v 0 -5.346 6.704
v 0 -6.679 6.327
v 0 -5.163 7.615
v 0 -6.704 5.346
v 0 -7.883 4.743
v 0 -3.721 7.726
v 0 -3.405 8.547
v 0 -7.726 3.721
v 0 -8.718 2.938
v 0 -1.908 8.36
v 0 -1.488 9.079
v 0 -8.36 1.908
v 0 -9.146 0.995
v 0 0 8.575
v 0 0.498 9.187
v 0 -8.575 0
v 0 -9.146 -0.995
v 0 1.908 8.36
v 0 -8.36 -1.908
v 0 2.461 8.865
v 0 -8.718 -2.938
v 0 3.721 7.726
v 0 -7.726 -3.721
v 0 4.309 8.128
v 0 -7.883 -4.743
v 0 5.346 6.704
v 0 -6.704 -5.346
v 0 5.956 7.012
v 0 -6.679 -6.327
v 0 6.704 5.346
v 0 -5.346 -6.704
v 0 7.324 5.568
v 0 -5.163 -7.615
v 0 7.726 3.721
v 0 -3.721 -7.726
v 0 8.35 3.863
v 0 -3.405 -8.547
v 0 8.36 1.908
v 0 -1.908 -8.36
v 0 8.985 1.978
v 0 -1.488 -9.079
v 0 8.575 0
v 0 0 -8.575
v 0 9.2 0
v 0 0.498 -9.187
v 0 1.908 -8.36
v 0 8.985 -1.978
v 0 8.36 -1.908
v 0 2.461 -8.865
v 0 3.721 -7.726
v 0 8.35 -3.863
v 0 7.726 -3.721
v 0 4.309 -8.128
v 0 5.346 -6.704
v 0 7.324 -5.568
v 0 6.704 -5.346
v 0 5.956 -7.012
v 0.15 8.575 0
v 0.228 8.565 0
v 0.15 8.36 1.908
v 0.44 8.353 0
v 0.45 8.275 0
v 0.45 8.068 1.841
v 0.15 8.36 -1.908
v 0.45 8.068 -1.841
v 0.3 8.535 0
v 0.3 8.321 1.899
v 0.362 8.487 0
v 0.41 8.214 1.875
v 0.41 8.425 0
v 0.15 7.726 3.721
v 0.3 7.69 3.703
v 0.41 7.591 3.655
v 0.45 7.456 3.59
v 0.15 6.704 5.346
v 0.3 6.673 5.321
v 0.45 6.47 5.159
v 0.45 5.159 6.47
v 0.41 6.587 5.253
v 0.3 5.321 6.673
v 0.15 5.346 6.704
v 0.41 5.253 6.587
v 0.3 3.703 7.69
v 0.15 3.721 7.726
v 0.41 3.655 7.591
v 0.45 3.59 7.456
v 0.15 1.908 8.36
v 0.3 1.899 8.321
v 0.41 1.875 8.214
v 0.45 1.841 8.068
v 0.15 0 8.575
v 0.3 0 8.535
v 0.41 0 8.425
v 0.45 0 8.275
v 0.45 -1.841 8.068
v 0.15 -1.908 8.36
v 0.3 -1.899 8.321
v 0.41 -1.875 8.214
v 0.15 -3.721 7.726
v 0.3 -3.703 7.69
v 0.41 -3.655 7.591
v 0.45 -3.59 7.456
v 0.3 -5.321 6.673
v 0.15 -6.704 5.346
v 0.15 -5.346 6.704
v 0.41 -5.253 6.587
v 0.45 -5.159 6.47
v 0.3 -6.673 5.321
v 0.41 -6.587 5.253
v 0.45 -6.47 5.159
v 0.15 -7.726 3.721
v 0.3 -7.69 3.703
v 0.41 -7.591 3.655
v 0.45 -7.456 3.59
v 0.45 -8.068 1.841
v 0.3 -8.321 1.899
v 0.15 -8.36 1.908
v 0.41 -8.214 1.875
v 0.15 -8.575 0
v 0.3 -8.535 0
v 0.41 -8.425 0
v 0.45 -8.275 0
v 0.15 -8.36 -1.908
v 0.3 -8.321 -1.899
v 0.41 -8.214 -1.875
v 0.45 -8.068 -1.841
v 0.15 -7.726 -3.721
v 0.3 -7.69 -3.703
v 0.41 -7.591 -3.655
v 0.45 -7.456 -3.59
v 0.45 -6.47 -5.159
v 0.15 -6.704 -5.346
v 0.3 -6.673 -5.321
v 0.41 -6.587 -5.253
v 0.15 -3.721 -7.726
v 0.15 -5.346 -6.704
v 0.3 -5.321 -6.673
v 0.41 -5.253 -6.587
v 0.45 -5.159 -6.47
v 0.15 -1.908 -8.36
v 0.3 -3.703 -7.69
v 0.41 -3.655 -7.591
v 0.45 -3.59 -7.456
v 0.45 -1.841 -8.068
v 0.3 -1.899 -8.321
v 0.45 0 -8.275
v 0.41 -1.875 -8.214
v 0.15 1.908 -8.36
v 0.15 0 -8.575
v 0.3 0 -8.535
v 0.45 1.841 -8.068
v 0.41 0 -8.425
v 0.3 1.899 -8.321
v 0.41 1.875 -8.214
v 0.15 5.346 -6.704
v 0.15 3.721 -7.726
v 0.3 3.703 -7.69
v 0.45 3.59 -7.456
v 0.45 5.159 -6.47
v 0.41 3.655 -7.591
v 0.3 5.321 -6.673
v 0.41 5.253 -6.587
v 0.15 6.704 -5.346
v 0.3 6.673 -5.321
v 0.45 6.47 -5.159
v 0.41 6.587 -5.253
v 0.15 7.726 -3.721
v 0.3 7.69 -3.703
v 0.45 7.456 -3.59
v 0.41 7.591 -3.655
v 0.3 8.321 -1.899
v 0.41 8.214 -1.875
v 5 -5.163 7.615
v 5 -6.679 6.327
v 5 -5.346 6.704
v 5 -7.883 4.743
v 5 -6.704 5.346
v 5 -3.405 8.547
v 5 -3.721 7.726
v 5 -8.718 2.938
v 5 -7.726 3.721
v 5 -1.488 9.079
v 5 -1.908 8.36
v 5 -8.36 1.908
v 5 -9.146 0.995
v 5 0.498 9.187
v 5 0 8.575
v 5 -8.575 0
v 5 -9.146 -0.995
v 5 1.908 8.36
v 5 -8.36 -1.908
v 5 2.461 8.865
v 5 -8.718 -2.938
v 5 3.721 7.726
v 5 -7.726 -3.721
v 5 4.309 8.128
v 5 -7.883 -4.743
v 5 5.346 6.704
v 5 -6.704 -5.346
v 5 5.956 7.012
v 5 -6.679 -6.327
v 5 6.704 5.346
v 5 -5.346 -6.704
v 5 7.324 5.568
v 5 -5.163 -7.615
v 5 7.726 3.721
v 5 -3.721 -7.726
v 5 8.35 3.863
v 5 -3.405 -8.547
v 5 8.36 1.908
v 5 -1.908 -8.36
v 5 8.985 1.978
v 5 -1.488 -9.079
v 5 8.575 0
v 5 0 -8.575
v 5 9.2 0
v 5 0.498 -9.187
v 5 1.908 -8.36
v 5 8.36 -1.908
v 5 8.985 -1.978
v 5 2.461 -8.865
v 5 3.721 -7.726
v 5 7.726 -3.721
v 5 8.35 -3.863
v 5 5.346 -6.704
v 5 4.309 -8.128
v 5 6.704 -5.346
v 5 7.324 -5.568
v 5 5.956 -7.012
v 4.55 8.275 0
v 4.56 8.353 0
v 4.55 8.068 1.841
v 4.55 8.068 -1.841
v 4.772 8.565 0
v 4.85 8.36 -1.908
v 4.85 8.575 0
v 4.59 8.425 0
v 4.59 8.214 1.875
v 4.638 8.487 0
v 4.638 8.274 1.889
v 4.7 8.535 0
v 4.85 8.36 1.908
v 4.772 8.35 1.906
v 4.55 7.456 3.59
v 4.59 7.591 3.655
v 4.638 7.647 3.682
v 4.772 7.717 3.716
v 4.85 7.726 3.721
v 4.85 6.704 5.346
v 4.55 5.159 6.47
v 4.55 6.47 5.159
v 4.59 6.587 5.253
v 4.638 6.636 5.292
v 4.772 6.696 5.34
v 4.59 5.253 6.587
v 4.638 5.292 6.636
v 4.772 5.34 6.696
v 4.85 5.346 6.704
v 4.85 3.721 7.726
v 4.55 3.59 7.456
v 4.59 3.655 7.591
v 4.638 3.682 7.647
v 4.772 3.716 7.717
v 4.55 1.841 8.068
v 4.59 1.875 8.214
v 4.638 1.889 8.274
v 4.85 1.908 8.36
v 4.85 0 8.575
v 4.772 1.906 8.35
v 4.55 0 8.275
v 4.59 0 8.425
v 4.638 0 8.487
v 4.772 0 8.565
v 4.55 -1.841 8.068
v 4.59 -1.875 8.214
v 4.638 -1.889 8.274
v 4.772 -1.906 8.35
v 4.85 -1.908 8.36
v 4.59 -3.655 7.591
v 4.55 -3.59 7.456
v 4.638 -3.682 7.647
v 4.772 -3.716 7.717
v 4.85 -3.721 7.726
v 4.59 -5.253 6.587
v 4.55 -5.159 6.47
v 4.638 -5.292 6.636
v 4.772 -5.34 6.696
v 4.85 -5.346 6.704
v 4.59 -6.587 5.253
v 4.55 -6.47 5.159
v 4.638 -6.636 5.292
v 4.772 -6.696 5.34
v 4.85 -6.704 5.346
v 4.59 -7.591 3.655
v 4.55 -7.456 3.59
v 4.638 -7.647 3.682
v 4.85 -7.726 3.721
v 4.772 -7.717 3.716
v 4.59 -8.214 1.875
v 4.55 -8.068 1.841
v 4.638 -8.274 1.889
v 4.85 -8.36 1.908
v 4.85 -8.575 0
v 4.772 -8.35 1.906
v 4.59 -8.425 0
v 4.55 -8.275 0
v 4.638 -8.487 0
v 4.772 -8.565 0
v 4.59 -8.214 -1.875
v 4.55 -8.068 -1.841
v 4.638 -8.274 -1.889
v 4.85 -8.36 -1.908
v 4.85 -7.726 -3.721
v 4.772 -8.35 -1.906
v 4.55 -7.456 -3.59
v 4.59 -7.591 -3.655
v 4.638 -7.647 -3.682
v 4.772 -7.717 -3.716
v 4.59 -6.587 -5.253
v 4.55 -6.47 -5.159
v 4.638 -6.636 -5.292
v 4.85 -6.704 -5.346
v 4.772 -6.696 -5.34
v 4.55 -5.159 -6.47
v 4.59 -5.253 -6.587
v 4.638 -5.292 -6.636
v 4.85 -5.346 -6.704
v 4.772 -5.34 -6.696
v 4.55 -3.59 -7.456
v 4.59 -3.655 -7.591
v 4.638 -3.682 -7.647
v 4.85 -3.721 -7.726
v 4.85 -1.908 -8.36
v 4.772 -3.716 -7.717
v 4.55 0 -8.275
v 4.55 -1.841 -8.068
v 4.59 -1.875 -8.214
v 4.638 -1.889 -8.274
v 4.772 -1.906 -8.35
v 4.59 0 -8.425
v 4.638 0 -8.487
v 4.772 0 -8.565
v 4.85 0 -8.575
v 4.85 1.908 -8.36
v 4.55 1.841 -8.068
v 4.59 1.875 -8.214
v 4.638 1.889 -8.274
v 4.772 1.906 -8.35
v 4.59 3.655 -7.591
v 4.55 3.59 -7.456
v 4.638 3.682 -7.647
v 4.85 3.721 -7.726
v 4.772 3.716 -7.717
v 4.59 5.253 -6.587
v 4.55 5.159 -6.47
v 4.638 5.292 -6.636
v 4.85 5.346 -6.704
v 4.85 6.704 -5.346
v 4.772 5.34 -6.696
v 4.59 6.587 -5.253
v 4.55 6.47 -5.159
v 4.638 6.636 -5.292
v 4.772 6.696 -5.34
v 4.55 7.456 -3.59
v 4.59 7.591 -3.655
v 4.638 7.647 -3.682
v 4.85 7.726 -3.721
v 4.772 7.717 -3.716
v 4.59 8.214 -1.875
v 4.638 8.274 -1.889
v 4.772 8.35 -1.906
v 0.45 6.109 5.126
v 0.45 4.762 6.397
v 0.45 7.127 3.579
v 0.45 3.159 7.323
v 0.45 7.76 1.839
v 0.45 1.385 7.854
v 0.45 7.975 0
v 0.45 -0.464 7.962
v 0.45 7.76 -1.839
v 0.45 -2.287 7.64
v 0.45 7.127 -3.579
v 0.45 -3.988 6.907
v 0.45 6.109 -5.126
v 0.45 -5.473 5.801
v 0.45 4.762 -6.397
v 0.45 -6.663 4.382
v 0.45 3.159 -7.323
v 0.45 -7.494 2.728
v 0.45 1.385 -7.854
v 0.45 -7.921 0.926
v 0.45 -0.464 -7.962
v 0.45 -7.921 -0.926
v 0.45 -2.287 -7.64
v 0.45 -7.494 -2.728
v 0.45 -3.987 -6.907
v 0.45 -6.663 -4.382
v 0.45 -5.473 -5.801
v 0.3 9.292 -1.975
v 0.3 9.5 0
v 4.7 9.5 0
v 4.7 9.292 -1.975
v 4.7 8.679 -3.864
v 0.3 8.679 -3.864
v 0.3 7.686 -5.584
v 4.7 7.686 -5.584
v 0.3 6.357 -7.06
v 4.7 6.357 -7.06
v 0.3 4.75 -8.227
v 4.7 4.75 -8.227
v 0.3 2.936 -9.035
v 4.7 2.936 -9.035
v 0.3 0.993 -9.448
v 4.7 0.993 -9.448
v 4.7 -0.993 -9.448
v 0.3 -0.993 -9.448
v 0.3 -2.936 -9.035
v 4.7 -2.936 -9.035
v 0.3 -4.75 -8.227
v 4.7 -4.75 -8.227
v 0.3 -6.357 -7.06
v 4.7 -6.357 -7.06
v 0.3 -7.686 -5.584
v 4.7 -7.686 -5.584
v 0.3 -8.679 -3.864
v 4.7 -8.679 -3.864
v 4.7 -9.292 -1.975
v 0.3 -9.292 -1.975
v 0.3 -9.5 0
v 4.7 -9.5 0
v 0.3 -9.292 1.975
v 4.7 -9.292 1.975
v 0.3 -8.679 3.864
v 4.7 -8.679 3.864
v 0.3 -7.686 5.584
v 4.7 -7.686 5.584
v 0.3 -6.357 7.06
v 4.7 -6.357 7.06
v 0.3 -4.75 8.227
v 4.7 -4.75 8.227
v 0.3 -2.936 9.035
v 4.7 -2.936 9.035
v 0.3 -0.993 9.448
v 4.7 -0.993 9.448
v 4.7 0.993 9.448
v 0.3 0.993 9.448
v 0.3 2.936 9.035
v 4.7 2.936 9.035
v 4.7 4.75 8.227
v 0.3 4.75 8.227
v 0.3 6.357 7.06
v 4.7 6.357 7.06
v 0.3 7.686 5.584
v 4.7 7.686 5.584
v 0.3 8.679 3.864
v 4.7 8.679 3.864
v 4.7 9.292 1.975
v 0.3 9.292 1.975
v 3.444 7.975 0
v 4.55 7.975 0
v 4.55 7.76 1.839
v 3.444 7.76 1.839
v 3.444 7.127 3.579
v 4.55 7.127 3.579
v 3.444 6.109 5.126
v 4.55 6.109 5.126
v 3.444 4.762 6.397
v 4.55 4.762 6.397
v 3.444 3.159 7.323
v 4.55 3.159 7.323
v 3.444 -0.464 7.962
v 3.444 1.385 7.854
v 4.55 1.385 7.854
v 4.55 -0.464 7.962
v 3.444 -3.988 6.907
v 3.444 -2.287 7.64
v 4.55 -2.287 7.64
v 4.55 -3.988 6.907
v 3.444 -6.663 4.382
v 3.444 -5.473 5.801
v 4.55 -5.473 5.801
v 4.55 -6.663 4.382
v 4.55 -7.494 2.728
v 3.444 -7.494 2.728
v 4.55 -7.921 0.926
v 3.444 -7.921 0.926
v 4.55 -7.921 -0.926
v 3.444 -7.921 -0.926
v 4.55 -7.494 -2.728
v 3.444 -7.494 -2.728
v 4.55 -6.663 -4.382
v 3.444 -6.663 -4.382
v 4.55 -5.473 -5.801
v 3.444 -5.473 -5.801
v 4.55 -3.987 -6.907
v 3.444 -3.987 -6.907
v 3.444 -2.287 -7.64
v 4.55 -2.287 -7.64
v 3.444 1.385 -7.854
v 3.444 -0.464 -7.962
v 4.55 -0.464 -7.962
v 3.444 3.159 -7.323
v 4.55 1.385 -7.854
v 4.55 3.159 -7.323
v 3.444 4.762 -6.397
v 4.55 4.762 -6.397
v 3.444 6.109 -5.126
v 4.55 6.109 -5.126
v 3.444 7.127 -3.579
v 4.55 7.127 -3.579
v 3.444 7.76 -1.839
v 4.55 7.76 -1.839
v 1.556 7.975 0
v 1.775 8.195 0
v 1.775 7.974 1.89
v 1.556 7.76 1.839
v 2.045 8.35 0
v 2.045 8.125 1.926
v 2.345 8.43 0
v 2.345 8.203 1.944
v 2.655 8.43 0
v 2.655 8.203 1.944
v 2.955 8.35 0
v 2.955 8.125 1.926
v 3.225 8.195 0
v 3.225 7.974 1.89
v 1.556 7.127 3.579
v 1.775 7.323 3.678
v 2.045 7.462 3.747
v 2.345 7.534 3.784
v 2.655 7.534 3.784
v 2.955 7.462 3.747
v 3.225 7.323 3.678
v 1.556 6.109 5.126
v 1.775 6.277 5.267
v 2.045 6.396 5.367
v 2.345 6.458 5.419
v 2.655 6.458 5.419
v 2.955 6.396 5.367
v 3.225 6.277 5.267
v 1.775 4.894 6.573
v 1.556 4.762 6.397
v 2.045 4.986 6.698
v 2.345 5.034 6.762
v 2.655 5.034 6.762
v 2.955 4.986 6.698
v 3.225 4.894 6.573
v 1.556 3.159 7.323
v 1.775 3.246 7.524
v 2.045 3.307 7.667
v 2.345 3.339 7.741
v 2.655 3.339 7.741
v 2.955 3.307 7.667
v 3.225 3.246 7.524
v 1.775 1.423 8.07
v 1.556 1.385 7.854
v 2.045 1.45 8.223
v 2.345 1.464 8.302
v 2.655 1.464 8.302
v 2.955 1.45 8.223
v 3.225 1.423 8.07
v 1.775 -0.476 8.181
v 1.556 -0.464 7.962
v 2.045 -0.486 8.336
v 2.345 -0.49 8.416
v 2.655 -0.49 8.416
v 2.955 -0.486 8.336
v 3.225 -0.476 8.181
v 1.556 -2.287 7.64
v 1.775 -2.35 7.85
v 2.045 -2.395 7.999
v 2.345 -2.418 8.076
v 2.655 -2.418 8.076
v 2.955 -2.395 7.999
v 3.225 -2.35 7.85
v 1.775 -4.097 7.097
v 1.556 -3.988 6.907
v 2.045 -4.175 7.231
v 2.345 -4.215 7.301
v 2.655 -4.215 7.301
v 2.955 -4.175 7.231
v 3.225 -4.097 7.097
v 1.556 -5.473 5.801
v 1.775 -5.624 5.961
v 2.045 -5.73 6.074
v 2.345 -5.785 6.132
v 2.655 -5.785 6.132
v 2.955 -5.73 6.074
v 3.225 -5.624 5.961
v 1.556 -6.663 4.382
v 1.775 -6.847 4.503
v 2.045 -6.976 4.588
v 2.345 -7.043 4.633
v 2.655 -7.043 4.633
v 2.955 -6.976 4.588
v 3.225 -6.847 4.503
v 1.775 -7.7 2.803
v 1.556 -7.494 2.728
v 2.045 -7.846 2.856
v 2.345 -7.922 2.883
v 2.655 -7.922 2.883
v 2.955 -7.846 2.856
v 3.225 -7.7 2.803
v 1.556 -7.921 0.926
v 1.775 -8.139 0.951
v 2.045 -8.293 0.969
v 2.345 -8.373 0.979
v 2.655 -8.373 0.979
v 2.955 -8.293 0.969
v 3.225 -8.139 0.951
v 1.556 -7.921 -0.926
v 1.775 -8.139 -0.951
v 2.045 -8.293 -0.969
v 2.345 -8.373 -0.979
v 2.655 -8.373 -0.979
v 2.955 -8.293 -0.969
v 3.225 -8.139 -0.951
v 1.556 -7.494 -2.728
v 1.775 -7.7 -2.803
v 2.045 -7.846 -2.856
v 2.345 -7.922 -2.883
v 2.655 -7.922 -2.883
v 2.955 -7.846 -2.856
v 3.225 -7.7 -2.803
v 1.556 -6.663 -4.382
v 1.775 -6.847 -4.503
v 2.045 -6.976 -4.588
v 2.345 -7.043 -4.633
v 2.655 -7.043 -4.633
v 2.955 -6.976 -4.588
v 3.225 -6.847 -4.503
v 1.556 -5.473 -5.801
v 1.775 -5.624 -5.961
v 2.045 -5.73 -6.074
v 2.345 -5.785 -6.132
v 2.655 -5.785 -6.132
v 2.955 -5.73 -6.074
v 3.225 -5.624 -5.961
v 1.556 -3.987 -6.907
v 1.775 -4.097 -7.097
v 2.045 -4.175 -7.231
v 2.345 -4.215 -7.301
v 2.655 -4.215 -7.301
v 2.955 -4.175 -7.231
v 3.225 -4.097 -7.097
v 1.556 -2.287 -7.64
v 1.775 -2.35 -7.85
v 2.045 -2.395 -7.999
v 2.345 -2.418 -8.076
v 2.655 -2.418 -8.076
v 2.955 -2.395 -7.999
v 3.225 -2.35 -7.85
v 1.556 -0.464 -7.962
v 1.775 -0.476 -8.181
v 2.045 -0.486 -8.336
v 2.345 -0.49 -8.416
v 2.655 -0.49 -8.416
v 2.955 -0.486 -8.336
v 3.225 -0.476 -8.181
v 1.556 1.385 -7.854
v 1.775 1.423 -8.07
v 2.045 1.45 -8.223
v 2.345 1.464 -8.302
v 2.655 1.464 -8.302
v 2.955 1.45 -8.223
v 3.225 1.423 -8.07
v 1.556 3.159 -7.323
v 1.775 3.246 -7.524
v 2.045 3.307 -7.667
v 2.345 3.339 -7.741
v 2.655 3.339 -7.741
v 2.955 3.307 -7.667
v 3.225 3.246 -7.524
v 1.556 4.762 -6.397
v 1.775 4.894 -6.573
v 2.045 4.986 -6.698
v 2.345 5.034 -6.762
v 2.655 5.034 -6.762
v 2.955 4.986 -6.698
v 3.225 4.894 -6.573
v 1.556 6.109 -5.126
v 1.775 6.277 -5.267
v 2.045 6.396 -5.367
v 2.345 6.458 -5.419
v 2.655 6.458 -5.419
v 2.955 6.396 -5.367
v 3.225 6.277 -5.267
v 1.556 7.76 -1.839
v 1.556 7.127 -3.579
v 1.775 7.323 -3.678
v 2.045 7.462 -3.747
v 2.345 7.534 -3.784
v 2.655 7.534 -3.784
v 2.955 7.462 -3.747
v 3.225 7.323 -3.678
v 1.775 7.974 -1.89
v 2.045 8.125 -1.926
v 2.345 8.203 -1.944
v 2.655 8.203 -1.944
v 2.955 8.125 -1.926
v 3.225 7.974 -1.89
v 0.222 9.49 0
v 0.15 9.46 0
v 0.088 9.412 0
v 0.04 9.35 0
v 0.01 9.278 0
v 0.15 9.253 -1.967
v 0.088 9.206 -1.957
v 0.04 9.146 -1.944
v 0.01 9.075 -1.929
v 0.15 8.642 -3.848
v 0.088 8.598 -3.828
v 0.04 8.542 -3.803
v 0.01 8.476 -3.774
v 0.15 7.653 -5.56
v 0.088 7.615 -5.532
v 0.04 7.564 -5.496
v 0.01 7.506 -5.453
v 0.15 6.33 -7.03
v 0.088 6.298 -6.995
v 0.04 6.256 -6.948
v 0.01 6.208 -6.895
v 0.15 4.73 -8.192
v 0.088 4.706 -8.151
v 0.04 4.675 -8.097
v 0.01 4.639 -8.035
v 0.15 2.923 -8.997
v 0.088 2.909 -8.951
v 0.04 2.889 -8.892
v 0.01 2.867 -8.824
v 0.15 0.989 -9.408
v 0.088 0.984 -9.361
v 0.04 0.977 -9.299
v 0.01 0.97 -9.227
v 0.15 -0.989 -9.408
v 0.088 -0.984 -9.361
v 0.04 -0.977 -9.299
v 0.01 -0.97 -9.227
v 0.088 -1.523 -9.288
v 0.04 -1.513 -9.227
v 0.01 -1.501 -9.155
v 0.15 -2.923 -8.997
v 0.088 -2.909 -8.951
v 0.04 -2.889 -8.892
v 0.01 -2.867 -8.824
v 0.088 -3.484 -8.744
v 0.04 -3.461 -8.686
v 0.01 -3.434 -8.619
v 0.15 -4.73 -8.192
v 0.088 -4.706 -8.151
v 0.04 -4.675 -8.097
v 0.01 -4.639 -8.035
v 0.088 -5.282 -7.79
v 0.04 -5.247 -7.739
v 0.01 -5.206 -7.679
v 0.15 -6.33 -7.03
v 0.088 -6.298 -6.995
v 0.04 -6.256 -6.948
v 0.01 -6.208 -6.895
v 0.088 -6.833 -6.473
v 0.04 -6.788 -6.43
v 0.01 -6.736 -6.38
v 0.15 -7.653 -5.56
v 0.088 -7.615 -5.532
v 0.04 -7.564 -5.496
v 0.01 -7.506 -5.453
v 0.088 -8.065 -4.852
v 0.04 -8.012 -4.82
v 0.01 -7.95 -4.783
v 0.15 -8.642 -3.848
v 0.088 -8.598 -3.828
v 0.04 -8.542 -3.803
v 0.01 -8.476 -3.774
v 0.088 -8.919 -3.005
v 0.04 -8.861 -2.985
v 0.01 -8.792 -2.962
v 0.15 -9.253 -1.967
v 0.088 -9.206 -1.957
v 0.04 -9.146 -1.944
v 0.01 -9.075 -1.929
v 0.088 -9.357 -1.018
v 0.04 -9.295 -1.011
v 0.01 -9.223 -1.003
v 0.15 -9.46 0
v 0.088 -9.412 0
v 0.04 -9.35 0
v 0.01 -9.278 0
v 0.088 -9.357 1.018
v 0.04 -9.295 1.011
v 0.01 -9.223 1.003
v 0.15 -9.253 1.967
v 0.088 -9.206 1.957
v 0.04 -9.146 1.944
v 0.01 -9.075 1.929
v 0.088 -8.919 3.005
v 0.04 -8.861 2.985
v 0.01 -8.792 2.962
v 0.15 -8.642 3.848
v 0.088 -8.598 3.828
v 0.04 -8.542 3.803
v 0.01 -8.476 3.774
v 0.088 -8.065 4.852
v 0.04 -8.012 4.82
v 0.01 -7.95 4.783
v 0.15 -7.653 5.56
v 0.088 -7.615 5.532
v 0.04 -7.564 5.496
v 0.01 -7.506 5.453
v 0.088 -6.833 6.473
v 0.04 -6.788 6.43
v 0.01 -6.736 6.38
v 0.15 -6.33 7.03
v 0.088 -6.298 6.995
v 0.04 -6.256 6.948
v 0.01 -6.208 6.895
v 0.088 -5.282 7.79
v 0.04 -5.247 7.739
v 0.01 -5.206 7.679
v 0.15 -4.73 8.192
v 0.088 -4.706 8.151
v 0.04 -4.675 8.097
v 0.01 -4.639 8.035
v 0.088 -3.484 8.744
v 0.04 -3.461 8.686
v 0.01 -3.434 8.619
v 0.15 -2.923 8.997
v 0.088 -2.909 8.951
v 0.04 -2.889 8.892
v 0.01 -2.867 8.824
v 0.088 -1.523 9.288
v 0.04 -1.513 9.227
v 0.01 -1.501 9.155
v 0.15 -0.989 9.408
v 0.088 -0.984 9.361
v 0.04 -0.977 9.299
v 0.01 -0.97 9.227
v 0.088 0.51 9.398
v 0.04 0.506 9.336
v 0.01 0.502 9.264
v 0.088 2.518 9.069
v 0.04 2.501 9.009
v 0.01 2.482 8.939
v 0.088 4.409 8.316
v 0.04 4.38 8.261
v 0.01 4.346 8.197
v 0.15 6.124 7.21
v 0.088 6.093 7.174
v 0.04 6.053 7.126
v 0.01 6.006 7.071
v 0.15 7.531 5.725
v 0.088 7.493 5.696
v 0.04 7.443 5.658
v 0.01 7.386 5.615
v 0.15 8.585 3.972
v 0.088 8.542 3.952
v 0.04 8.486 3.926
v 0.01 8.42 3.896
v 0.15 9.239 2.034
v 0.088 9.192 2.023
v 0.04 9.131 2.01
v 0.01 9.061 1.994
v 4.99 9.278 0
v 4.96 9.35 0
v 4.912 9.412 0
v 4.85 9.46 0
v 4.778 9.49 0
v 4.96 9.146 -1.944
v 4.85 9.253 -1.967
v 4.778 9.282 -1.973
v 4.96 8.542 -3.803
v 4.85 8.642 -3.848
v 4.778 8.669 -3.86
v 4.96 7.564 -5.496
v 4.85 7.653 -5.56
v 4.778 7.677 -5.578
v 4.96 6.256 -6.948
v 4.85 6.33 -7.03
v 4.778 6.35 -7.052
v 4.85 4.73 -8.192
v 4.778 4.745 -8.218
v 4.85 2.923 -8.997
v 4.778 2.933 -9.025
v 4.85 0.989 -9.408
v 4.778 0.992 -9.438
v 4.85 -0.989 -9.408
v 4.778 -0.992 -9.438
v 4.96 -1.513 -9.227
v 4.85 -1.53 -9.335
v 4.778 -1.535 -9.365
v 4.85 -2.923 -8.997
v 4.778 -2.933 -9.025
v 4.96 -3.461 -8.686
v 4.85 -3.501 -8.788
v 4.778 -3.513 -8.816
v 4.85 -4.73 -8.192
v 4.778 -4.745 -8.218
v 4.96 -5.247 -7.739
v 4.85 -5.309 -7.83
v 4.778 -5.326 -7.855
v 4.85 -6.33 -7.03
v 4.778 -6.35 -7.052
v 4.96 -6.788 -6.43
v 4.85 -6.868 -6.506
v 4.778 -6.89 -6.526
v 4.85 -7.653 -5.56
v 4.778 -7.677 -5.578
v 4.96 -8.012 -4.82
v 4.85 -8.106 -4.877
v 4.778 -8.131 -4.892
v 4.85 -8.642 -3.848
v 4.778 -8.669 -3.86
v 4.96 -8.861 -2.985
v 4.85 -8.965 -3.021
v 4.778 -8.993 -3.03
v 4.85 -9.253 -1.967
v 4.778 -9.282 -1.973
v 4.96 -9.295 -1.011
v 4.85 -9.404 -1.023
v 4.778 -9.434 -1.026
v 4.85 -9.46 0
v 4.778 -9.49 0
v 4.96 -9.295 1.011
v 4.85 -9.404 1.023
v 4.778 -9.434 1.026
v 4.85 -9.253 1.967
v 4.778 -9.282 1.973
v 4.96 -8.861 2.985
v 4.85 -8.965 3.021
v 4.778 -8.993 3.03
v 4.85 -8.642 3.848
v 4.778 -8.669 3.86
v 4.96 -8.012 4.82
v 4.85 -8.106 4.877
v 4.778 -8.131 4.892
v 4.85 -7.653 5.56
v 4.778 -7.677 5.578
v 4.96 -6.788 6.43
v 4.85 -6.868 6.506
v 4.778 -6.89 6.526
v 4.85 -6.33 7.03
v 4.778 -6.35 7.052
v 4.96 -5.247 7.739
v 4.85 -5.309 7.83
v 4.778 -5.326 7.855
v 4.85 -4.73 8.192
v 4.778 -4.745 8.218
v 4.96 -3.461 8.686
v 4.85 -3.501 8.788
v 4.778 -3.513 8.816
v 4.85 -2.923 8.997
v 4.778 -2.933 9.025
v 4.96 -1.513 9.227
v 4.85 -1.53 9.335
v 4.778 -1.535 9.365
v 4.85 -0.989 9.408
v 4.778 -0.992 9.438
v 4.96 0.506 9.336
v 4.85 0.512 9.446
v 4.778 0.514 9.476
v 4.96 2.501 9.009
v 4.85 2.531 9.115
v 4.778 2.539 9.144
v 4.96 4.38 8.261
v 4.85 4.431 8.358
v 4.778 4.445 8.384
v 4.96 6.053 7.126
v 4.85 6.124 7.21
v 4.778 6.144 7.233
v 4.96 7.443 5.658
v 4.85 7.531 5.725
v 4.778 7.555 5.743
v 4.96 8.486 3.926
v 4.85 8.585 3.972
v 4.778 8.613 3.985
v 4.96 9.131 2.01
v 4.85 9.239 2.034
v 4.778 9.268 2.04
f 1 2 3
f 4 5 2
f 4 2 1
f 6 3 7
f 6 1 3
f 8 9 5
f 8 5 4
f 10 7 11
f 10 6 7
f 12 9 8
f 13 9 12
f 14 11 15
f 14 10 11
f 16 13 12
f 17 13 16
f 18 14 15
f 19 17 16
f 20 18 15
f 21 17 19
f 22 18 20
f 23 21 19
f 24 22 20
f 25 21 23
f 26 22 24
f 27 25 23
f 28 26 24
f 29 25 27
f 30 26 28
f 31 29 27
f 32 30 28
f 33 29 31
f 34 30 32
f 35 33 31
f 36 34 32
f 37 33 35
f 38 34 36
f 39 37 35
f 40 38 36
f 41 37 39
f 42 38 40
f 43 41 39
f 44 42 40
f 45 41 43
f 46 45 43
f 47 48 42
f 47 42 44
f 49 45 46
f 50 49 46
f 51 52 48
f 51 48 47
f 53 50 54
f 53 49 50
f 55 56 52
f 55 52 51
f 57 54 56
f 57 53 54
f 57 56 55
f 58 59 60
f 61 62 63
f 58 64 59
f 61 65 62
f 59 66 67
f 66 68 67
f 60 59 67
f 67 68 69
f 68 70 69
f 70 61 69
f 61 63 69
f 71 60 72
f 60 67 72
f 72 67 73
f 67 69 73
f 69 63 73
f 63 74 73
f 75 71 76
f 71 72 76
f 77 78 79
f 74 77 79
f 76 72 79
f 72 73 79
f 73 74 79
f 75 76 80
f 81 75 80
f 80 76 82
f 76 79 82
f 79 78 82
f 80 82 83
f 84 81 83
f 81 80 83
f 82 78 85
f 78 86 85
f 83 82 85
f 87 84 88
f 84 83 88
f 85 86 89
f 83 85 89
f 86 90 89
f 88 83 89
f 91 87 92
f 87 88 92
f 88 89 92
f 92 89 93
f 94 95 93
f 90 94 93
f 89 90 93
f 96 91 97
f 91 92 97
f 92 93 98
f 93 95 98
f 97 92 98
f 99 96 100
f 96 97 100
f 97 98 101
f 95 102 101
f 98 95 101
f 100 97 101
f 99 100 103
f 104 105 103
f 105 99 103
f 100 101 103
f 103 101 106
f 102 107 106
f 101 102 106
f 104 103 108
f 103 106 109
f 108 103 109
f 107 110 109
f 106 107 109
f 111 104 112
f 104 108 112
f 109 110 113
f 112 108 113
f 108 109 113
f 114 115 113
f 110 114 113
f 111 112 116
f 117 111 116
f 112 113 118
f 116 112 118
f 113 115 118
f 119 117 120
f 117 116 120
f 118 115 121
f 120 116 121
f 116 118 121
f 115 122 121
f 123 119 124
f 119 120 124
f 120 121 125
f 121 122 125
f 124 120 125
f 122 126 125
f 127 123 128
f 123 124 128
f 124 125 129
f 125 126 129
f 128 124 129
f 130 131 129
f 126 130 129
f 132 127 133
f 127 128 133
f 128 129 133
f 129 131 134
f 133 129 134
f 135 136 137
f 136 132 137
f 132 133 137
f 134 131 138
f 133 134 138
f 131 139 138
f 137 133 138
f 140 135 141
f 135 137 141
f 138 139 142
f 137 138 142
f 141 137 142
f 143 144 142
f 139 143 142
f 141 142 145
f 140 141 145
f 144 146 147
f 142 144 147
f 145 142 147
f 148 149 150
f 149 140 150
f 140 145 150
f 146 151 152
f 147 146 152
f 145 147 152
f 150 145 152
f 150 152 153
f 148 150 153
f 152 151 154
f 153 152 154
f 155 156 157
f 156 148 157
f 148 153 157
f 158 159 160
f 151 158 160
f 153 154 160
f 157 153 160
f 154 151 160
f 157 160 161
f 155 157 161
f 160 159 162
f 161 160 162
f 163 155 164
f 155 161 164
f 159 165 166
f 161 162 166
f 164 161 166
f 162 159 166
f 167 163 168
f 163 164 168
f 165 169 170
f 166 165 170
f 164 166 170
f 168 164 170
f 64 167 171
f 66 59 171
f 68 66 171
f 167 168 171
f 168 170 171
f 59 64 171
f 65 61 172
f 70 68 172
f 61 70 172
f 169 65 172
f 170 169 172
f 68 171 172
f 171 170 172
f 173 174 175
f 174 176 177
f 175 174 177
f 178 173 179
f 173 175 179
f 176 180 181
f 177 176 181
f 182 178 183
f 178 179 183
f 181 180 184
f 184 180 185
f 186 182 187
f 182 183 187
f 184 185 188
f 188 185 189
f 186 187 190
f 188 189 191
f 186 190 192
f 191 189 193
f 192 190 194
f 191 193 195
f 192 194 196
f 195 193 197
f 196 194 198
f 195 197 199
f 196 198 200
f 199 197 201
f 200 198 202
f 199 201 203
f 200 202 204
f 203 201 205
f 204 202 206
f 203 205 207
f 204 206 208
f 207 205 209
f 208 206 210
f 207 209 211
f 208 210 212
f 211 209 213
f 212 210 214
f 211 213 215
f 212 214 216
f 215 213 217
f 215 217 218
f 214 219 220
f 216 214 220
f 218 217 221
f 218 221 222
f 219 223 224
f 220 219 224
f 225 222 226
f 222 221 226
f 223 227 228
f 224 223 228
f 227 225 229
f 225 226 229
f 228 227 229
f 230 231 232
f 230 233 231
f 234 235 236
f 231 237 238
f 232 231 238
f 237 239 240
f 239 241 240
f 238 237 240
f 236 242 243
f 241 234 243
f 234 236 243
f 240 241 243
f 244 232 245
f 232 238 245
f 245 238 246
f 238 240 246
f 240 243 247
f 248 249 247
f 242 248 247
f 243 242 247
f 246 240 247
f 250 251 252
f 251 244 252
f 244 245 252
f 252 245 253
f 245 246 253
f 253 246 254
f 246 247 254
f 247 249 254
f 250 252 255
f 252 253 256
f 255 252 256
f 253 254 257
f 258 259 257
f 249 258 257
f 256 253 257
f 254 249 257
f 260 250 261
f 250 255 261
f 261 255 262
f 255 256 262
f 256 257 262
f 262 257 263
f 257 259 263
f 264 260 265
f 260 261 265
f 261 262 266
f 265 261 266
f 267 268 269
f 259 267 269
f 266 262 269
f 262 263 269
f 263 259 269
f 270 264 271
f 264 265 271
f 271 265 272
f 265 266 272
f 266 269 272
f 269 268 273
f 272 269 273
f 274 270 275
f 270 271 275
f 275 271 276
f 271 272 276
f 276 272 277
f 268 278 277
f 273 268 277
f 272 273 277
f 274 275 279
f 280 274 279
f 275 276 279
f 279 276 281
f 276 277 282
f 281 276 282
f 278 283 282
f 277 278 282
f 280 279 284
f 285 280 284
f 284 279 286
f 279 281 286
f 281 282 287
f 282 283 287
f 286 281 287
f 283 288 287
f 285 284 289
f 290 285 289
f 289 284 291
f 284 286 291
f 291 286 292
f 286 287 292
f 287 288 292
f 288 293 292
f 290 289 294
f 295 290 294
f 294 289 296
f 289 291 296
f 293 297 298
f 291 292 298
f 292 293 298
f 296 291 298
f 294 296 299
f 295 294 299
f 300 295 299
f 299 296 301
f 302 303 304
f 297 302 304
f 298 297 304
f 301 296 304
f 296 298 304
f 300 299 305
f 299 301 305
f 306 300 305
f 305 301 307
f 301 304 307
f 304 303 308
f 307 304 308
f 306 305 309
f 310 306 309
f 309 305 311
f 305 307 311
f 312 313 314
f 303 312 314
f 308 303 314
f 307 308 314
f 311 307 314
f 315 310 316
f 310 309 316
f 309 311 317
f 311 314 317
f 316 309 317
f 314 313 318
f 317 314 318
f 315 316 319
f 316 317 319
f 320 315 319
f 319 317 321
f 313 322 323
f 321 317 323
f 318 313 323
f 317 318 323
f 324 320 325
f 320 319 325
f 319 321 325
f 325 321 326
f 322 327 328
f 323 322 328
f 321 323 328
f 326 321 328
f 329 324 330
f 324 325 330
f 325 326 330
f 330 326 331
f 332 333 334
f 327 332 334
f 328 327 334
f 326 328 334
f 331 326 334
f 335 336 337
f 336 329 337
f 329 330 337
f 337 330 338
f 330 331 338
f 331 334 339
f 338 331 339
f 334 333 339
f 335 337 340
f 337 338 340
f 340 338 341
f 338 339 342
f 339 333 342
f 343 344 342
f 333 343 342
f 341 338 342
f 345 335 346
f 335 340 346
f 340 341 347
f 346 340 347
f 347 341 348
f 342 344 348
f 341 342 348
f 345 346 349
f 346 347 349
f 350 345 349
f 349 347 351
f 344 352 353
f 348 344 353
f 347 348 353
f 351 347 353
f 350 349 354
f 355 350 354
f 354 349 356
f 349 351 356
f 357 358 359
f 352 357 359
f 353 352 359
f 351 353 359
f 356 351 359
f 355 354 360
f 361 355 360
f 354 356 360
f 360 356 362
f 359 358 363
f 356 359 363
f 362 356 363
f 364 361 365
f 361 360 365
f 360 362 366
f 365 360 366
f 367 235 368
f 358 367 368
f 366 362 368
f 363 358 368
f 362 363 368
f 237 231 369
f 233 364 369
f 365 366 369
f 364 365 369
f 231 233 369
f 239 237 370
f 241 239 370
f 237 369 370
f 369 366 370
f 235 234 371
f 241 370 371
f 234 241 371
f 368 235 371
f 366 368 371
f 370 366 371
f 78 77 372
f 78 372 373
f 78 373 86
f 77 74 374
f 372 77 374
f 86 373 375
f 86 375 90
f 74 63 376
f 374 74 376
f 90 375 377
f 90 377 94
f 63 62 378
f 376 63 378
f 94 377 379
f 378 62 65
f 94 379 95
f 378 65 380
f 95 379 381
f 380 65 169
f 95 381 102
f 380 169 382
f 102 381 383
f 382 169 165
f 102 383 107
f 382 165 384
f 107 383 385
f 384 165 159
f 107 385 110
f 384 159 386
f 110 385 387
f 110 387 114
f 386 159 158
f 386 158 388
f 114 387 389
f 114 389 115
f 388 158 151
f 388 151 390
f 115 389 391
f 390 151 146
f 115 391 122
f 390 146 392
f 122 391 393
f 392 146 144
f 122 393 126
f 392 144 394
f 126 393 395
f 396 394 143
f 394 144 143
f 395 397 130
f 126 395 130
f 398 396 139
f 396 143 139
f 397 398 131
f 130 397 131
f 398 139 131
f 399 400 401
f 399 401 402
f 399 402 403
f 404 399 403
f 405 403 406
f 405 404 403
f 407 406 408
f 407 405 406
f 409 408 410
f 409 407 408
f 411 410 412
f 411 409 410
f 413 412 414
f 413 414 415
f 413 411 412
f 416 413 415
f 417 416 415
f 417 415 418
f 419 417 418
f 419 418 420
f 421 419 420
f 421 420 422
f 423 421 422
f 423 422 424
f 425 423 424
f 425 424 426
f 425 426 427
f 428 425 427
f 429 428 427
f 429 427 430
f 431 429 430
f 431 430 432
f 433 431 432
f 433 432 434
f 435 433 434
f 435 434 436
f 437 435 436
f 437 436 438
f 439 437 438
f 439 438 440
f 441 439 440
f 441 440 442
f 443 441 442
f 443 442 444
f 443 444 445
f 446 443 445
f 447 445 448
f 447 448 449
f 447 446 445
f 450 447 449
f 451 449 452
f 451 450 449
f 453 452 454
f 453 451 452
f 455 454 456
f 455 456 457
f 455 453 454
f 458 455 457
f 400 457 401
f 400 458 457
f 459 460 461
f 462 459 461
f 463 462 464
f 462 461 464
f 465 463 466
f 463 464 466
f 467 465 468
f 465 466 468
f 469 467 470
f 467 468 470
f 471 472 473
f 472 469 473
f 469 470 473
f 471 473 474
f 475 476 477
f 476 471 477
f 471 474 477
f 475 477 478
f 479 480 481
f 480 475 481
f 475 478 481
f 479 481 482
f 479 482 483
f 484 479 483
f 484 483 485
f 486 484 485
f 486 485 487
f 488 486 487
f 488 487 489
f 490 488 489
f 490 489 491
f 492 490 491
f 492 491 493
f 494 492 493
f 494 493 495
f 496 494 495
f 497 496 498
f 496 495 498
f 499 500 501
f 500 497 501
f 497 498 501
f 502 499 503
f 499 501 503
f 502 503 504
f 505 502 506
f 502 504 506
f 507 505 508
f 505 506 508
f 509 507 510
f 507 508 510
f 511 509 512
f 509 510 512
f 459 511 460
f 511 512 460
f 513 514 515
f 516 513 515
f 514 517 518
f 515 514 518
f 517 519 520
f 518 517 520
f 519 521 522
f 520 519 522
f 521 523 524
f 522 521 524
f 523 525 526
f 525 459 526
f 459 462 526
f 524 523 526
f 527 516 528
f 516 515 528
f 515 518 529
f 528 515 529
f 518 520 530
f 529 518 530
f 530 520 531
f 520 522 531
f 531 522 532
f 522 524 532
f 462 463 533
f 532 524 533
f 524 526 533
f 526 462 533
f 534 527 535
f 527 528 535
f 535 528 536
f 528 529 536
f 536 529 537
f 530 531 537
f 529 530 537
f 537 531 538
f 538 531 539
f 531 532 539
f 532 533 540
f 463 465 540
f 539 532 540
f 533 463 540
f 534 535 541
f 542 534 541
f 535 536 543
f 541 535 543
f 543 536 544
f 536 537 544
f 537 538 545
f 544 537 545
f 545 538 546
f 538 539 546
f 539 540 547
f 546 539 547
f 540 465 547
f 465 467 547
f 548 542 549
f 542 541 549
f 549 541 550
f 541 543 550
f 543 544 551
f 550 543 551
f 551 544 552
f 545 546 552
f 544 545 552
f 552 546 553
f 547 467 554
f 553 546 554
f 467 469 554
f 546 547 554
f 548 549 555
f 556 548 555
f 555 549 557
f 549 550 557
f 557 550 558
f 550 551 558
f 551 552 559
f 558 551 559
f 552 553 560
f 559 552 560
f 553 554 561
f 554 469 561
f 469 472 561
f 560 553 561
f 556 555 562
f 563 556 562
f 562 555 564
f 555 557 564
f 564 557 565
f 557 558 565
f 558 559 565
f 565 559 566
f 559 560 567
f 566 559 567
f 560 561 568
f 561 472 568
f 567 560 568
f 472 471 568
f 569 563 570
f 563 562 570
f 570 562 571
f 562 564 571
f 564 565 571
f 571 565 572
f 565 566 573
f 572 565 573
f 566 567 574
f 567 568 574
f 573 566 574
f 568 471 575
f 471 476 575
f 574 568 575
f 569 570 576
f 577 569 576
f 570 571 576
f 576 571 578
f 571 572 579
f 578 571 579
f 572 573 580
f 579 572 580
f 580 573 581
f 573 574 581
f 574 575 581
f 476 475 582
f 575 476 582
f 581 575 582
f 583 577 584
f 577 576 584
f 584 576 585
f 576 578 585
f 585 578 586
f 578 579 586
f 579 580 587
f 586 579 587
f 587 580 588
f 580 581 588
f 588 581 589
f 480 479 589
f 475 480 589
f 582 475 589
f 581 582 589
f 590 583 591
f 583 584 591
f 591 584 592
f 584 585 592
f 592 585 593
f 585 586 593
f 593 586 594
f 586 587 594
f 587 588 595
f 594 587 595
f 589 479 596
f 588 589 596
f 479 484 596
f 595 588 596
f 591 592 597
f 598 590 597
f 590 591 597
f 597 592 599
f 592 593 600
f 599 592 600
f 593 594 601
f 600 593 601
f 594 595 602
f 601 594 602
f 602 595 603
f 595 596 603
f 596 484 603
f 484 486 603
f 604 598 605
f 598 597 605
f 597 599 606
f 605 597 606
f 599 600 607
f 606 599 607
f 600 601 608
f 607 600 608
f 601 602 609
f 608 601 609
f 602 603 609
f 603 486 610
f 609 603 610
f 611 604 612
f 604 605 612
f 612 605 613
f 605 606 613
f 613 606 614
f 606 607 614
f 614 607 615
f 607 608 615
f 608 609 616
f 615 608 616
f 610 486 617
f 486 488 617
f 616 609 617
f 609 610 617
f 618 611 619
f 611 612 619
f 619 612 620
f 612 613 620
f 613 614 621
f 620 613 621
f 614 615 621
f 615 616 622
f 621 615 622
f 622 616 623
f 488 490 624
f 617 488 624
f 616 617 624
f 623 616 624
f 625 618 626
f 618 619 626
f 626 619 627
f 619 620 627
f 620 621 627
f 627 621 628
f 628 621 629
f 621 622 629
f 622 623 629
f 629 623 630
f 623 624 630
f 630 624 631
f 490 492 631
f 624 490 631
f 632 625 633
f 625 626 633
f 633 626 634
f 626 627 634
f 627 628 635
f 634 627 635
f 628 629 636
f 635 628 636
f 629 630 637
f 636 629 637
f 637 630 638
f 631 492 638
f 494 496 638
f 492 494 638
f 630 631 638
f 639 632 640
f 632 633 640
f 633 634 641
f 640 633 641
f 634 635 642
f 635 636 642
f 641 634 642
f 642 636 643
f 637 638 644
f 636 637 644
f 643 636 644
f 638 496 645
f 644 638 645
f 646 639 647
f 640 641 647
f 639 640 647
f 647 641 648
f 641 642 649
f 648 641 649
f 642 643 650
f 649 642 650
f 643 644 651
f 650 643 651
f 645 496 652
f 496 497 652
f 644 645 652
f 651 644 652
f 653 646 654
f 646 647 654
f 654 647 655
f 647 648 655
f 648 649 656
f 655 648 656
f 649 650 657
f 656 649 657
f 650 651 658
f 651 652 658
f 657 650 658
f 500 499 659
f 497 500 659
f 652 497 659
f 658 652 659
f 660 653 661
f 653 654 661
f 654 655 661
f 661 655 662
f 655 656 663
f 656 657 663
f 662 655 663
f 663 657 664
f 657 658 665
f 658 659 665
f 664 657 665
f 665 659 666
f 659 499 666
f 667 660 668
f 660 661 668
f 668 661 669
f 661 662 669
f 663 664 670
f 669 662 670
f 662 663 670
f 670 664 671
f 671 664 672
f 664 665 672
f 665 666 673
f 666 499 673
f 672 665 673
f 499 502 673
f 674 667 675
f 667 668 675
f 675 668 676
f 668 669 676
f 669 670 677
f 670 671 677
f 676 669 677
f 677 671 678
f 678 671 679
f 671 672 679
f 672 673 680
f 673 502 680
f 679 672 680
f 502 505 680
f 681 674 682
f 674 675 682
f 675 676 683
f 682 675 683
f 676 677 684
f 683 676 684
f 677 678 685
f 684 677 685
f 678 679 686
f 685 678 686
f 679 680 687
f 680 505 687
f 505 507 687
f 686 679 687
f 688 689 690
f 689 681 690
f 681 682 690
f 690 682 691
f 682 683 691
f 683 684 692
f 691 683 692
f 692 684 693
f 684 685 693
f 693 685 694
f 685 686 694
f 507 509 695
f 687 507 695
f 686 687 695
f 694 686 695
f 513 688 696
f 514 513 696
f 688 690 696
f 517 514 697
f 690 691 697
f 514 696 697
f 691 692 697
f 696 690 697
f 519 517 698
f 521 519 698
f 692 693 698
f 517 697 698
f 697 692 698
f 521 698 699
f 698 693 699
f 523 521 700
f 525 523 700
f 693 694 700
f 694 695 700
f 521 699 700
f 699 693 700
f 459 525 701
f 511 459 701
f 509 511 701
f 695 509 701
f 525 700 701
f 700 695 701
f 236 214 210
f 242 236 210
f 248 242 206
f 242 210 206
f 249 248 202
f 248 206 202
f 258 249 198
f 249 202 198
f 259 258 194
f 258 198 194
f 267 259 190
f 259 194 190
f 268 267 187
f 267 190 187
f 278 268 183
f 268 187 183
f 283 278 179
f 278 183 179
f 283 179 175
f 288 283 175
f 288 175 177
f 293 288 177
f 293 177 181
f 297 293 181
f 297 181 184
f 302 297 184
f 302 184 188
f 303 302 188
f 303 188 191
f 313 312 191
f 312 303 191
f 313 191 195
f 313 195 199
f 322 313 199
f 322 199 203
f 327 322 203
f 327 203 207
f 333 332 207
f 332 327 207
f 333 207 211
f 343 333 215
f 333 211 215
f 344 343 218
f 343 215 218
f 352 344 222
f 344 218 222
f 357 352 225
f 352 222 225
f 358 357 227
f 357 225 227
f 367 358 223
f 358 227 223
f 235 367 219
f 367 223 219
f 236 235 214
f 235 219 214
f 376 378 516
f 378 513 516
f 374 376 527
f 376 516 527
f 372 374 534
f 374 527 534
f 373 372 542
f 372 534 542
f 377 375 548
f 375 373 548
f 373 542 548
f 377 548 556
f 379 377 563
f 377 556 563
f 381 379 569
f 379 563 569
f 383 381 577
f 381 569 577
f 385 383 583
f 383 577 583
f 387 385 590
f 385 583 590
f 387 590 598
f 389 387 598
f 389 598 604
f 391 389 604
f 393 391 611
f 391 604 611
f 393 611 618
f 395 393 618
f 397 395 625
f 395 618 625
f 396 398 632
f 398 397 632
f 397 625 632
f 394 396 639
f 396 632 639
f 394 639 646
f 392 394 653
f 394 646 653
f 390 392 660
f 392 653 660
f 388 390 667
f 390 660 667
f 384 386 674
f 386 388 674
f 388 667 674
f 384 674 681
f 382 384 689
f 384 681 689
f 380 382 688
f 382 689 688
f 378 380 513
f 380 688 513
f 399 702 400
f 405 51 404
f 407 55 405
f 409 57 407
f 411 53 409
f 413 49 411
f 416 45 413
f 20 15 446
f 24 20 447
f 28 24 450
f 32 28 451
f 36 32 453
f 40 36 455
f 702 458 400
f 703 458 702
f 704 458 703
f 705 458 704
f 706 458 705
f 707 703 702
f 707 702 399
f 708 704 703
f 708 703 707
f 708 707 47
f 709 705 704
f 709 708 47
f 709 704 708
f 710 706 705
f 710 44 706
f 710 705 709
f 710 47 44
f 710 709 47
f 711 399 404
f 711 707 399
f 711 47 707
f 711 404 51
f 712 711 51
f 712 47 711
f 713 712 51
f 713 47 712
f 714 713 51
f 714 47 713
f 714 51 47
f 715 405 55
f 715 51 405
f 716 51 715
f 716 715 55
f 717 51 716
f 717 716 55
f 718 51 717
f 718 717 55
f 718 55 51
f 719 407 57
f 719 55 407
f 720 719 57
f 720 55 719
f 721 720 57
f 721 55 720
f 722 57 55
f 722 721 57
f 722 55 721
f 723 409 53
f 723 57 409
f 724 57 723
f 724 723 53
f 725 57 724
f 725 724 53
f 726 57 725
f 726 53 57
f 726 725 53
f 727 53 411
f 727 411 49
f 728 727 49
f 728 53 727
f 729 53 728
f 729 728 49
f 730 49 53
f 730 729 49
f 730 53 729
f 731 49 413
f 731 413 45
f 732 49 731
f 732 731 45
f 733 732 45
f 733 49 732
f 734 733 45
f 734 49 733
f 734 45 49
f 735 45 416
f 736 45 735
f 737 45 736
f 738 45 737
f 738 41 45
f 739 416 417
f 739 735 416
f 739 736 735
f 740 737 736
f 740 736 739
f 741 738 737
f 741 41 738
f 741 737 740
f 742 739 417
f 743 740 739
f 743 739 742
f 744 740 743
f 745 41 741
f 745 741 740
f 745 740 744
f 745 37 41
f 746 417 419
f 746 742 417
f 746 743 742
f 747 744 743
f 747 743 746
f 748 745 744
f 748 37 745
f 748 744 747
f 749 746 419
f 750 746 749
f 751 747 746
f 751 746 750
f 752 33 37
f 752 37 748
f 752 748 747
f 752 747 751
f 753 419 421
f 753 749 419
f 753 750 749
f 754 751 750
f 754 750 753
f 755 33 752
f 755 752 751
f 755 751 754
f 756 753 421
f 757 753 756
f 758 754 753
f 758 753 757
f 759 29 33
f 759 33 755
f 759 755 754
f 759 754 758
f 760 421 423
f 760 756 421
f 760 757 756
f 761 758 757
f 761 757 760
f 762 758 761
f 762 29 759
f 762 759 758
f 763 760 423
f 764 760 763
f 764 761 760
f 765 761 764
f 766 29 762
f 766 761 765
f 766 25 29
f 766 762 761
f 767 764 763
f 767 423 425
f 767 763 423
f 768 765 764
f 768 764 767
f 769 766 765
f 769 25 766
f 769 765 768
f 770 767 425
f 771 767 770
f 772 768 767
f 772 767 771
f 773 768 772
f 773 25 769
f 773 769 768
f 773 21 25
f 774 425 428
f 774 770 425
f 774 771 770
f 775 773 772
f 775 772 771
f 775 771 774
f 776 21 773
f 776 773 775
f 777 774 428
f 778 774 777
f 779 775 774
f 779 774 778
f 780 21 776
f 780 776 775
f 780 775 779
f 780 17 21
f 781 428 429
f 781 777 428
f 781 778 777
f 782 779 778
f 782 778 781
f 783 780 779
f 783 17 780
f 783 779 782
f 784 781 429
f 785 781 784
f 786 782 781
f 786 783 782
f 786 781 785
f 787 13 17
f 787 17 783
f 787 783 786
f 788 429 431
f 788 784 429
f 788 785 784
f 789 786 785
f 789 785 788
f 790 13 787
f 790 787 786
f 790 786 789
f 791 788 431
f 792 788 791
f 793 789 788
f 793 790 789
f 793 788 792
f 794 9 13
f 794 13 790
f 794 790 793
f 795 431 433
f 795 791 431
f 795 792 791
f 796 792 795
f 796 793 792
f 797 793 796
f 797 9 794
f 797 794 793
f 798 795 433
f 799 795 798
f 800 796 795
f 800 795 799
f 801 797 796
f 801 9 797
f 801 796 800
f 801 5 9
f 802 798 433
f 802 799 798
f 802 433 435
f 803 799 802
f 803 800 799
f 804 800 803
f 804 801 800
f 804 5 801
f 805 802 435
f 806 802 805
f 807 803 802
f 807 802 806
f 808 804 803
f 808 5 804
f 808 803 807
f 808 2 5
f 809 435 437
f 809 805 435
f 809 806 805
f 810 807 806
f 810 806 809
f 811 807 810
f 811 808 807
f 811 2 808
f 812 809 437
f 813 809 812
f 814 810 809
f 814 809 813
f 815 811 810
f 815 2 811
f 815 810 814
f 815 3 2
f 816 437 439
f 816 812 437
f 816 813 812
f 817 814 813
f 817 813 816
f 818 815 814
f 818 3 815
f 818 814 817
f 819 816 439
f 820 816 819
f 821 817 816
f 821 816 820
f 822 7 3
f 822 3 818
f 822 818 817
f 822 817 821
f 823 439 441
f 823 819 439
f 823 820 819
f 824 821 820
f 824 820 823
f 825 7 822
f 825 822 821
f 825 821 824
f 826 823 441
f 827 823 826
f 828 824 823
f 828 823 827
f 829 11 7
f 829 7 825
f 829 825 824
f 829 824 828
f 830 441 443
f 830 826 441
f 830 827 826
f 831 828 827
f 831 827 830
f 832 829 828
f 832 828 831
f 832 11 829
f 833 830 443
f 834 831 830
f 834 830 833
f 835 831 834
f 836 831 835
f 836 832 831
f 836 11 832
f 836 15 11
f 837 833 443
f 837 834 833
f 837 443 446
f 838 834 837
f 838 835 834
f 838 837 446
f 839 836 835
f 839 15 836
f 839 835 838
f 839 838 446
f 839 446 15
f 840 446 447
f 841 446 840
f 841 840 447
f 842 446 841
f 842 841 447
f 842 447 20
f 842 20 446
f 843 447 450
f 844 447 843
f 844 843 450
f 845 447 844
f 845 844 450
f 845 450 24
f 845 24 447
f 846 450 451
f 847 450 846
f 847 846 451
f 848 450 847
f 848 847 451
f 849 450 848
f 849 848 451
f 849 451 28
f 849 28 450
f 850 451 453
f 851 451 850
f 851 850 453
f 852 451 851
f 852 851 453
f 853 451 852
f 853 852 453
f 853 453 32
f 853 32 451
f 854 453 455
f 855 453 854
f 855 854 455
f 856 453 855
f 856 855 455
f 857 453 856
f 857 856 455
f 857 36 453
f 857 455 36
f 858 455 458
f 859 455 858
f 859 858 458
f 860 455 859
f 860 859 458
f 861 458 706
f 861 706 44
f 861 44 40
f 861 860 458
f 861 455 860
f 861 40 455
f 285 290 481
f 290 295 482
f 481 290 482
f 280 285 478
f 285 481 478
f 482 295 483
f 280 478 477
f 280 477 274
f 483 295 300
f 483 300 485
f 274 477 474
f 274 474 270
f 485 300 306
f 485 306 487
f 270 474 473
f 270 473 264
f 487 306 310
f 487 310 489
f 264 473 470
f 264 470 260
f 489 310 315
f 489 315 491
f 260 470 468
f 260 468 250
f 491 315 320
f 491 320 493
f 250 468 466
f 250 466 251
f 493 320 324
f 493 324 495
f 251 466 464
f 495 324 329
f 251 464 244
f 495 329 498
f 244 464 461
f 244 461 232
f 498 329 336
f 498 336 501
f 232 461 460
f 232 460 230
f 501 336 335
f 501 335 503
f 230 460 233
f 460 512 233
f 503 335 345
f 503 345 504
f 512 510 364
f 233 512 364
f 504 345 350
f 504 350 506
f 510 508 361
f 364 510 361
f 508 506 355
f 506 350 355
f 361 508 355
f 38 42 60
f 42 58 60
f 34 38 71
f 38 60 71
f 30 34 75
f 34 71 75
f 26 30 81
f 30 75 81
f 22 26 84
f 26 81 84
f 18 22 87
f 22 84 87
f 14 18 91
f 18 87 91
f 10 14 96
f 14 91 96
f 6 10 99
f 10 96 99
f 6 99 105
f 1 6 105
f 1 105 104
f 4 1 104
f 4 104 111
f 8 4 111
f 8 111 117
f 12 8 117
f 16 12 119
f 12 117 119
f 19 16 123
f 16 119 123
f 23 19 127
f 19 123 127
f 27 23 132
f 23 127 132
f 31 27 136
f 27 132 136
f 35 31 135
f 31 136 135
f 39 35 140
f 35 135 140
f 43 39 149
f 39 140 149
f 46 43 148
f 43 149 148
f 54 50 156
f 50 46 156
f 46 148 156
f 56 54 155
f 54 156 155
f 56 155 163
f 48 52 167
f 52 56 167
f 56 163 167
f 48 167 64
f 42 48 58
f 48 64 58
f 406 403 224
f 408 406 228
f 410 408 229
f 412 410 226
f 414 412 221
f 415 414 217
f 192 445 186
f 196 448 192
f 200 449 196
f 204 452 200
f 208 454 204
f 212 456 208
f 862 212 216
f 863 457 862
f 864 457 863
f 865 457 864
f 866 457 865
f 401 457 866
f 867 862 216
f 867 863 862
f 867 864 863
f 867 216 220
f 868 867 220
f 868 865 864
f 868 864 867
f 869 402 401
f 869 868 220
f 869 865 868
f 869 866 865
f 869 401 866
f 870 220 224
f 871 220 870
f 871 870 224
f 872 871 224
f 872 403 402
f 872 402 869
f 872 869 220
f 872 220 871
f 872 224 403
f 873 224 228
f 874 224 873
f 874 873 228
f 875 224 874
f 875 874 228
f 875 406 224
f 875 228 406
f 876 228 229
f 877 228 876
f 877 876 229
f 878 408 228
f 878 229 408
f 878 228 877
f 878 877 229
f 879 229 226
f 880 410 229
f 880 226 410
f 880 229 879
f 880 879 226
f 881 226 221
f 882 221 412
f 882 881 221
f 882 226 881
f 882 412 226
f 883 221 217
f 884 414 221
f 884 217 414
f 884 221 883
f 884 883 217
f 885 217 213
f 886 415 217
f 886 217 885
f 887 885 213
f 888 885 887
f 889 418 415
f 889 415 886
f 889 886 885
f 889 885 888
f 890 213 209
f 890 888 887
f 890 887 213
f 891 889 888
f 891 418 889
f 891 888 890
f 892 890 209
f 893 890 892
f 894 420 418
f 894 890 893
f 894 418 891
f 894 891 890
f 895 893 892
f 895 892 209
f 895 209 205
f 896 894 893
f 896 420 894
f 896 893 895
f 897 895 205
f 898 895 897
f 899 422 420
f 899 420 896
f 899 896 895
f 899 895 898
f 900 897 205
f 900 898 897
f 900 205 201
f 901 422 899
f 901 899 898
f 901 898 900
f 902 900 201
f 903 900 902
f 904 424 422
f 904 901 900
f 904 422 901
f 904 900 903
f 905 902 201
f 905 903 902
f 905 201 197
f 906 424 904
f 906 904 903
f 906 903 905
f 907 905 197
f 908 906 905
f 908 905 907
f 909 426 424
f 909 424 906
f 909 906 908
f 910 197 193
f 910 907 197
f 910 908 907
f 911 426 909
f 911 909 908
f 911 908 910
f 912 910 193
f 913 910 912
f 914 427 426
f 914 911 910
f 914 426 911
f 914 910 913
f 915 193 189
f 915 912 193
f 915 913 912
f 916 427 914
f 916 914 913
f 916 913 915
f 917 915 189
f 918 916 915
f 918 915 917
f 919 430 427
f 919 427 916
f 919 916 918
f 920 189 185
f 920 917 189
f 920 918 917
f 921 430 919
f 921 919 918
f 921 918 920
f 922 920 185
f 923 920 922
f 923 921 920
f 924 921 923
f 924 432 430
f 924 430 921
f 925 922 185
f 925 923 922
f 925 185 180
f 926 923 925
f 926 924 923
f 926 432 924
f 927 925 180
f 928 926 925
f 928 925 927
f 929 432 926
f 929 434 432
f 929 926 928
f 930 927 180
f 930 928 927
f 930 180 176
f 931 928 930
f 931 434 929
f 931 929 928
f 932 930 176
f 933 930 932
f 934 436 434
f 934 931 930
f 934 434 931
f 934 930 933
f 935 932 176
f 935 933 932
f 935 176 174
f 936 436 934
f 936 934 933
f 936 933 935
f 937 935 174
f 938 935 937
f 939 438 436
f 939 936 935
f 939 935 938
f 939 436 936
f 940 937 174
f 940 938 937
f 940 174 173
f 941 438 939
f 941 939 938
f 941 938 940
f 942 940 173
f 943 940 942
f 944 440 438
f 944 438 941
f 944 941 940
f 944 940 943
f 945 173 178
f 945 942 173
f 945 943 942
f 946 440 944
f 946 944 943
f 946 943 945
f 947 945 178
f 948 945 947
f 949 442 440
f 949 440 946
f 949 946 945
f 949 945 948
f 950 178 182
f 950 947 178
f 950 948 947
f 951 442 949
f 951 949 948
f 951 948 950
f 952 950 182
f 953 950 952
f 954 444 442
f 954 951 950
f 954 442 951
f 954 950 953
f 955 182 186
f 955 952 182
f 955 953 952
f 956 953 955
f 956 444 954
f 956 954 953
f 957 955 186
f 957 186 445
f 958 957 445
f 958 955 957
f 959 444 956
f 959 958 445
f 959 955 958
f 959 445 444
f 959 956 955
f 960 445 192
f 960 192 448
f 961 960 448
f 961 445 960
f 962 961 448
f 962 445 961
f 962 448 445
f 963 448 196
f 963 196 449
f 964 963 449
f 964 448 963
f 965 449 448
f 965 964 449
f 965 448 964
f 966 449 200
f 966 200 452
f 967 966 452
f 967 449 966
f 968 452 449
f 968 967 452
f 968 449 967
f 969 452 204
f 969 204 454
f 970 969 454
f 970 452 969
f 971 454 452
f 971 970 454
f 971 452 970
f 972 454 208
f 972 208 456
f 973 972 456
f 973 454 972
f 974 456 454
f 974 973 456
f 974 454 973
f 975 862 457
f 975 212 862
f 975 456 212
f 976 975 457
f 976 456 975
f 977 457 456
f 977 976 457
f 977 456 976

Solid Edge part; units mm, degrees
sketch "Sketch1" plane through (0, 0, 0) normal (0, 0, 1) x (1, 0, 0)
  line L0 (0, 9.2) -> (0, 8.575)
  line L1 (0, 8.575) -> (0.15, 8.575)
  arc A0 (0.15, 8.575) -> (0.45, 8.275) centre (0.15, 8.275) cw
  line L2 (0.45, 8.275) -> (0.45, 7.975)
  line L3 (0.45, 7.975) -> (1.5557, 7.975)
  arc A1 (1.5557, 7.975) -> (3.4443, 7.975) centre (2.5, 7.25) cw
  line L4 (3.4443, 7.975) -> (4.55, 7.975)
  line L5 (4.55, 7.975) -> (4.55, 8.275)
  arc A2 (4.55, 8.275) -> (4.85, 8.575) centre (4.85, 8.275) cw
  line L6 (4.85, 8.575) -> (5, 8.575)
  line L7 (5, 8.575) -> (5, 9.2)
  arc A3 (5, 9.2) -> (4.7, 9.5) centre (4.7, 9.2) ccw
  line L8 (4.7, 9.5) -> (0.3, 9.5)
  arc A4 (0.3, 9.5) -> (0, 9.2) centre (0.3, 9.2) ccw
revolve "RevolvedProtrusion1" add sketch "Sketch1" angle 360 about axis through (50, 0, 0) along (-1, 0, 0)
properties part number "SKF_61800-2RS1_or"
